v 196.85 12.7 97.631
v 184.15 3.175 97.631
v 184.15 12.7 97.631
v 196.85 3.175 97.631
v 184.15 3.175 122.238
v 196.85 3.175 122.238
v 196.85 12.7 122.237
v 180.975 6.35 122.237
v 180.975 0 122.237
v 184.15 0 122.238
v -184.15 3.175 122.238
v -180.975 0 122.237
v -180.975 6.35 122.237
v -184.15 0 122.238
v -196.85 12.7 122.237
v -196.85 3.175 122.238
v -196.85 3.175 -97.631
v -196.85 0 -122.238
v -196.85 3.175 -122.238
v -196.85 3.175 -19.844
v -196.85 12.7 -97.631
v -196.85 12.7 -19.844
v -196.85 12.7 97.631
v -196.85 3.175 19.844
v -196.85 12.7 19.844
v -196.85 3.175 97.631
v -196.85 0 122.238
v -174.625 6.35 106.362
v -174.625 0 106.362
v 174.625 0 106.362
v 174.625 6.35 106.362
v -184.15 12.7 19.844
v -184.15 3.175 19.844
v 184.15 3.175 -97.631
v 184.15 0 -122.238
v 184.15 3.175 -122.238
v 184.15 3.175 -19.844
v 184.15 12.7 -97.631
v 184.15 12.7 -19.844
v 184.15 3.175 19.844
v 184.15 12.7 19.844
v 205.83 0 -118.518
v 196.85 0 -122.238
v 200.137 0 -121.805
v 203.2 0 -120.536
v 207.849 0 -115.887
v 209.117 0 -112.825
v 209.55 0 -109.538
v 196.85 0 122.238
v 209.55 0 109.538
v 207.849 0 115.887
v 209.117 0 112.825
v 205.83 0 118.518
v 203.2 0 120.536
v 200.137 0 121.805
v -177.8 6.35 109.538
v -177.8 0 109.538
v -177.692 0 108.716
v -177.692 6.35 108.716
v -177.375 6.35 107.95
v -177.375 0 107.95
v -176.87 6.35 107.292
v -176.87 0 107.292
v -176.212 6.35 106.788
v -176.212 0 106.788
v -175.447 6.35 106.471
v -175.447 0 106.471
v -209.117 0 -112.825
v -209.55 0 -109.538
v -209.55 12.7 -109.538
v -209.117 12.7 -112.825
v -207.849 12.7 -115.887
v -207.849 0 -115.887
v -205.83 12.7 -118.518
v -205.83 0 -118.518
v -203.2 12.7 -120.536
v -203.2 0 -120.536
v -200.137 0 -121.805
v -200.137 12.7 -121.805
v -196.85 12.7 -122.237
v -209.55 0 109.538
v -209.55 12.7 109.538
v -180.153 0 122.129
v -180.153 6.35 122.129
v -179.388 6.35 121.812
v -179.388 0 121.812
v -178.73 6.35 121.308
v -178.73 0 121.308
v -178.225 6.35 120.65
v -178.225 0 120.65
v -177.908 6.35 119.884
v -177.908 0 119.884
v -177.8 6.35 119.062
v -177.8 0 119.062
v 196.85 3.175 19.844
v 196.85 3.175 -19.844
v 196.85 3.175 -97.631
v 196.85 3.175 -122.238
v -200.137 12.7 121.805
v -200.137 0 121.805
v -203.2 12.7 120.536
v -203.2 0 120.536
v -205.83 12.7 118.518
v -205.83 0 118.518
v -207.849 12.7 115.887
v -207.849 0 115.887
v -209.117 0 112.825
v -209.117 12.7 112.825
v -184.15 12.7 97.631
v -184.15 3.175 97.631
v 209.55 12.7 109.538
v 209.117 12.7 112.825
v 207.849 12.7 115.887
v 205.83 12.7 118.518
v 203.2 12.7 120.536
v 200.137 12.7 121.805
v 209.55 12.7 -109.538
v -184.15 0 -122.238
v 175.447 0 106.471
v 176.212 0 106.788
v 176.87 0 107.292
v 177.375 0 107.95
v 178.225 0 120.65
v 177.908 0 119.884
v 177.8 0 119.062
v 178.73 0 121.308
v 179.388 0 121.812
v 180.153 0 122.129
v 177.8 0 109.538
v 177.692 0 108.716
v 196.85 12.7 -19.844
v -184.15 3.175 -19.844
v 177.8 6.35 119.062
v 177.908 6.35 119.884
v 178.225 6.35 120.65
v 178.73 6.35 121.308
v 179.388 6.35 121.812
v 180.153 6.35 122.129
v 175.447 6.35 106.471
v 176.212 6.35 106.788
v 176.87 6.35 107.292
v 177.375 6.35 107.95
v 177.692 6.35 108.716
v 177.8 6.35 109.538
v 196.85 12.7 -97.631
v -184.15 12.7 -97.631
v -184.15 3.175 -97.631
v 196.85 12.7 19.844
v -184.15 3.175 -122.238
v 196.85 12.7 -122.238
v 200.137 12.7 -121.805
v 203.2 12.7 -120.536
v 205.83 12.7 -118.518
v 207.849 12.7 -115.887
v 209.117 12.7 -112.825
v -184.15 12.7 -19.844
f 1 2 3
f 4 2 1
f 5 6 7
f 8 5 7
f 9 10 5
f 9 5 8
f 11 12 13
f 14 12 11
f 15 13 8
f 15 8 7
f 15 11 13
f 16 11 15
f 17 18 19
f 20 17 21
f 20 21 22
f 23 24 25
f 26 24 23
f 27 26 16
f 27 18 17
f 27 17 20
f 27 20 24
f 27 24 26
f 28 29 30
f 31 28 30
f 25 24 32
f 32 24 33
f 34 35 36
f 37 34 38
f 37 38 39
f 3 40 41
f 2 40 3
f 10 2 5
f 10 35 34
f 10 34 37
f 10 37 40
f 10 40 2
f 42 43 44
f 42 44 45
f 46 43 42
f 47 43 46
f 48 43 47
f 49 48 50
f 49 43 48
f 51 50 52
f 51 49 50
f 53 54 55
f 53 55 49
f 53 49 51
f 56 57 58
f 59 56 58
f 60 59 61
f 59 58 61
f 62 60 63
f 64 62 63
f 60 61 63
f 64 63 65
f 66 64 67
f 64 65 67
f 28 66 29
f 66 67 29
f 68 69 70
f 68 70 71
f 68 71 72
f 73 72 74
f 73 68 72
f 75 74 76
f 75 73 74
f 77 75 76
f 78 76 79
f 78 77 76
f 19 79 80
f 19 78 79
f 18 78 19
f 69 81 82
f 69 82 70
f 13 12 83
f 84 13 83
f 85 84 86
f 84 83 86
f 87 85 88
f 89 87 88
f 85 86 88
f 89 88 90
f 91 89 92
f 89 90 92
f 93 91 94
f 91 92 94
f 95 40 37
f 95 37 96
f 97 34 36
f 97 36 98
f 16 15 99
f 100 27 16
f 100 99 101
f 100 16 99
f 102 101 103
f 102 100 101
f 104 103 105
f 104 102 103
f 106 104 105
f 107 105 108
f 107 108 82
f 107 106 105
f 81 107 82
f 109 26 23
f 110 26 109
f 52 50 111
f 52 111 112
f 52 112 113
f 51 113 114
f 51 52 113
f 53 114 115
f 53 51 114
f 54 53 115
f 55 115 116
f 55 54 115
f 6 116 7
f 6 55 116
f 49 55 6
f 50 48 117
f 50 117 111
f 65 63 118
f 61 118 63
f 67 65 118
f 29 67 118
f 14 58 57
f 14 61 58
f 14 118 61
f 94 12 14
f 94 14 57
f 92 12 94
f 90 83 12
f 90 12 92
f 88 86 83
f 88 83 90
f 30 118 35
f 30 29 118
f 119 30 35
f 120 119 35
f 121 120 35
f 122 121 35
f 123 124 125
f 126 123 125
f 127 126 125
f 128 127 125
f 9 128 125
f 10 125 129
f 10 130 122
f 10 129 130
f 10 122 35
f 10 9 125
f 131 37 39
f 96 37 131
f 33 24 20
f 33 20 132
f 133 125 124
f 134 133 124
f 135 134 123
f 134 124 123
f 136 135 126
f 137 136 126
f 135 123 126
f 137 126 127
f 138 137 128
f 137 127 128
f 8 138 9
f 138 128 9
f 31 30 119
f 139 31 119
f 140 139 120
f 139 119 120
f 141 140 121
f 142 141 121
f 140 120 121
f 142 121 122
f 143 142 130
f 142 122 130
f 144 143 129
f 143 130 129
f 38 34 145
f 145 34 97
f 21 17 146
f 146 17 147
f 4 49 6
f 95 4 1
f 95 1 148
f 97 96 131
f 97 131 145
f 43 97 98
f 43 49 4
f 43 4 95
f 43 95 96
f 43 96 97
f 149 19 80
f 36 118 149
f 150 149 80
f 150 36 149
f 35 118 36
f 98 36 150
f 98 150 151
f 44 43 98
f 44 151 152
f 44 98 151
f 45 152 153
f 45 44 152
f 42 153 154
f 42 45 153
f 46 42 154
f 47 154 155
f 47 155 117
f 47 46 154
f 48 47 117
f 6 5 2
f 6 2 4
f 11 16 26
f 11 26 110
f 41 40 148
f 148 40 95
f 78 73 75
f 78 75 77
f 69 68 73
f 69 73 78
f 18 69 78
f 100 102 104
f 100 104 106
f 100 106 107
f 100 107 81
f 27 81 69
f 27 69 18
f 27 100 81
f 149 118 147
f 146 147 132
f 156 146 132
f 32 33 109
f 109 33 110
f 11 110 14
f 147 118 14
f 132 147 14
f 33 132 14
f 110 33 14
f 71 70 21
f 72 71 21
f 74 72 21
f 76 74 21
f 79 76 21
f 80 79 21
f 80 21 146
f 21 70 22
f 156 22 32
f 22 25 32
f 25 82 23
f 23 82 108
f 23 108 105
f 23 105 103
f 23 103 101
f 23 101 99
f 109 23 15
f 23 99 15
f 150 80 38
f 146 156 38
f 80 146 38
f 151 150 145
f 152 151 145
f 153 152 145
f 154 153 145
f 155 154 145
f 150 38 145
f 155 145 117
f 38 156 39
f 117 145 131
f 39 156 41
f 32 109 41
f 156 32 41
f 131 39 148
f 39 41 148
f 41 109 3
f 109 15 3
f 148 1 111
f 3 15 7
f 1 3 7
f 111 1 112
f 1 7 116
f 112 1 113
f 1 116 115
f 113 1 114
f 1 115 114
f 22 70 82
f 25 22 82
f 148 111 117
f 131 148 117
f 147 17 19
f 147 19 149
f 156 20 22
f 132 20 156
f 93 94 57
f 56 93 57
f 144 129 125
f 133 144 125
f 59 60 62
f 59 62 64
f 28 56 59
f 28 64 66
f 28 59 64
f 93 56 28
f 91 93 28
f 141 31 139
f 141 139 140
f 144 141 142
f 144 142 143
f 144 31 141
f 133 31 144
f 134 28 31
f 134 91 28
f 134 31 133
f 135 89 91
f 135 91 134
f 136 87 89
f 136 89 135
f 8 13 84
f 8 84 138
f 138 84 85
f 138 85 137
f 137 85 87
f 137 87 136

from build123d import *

# Parameters (mm, degrees)
F0_W     = 12.7
F0_H     = 24.60625
F0_H_2   = 39.6875
F1_DEPTH = 12.7
F2_DEPTH = 3.175
F3_DEPTH = 6.35


with BuildPart() as f1:
    # F0 (on Front) → F1 (new body)
    with BuildSketch(Plane.XZ):
        with BuildLine():
            Line((-196.85, 97.63125), (-196.85, 122.2375))
            ThreePointArc((-196.85, 122.2375), (-205.830256, 118.517756), (-209.55, 109.5375))
            Line((-209.55, 109.5375), (-209.55, -109.5375))
            ThreePointArc((-209.55, -109.5375), (-205.830256, -118.517756), (-196.85, -122.2375))
            Line((-196.85, -122.2375), (-196.85, -97.63125))
            Line((-196.85, -97.63125), (-196.85, -19.84375))
            Line((-196.85, -19.84375), (-196.85, 19.84375))
            Line((-196.85, 19.84375), (-196.85, 97.63125))
        make_face()
        with Locations((-190.5, 109.934375)):
            Rectangle(F0_W, F0_H)
        with Locations((-190.5, 0)):
            Rectangle(F0_W, F0_H_2)
        with Locations((-190.5, -109.934375)):
            Rectangle(F0_W, F0_H)
        with BuildLine():
            Line((-180.975, 122.2375), (-184.15, 122.2375))
            Line((-184.15, 122.2375), (-184.15, 97.63125))
            Line((-184.15, 97.63125), (-184.15, 19.84375))
            Line((-184.15, 19.84375), (-184.15, -19.84375))
            Line((-184.15, -19.84375), (-184.15, -97.63125))
            Line((-184.15, -97.63125), (-184.15, -122.2375))
            Line((-184.15, -122.2375), (184.15, -122.2375))
            Line((184.15, -122.2375), (184.15, -97.63125))
            Line((184.15, -97.63125), (184.15, -19.84375))
            Line((184.15, -19.84375), (184.15, 19.84375))
            Line((184.15, 19.84375), (184.15, 97.63125))
            Line((184.15, 97.63125), (184.15, 122.2375))
            Line((184.15, 122.2375), (180.975, 122.2375))
            ThreePointArc((180.975, 122.2375), (178.729936, 121.307564), (177.8, 119.0625))
            Line((177.8, 119.0625), (177.8, 109.5375))
            ThreePointArc((177.8, 109.5375), (176.870064, 107.292436), (174.625, 106.3625))
            Line((174.625, 106.3625), (-174.625, 106.3625))
            ThreePointArc((-174.625, 106.3625), (-176.870064, 107.292436), (-177.8, 109.5375))
            Line((-177.8, 109.5375), (-177.8, 119.0625))
            ThreePointArc((-177.8, 119.0625), (-178.729936, 121.307564), (-180.975, 122.2375))
        make_face()
        with Locations((190.5, -109.934375)):
            Rectangle(F0_W, F0_H)
        with BuildLine():
            ThreePointArc((209.55, 109.5375), (205.830256, 118.517756), (196.85, 122.2375))
            Line((196.85, 122.2375), (196.85, 97.63125))
            Line((196.85, 97.63125), (196.85, 19.84375))
            Line((196.85, 19.84375), (196.85, -19.84375))
            Line((196.85, -19.84375), (196.85, -97.63125))
            Line((196.85, -97.63125), (196.85, -122.2375))
            ThreePointArc((196.85, -122.2375), (205.830256, -118.517756), (209.55, -109.5375))
            Line((209.55, -109.5375), (209.55, 109.5375))
        make_face()
        with Locations((190.5, 0)):
            Rectangle(F0_W, F0_H_2)
        with Locations((190.5, 109.934375)):
            Rectangle(F0_W, F0_H)
        with BuildLine():
            Line((180.975, 122.2375), (-180.975, 122.2375))
            ThreePointArc((-180.975, 122.2375), (-178.729936, 121.307564), (-177.8, 119.0625))
            Line((-177.8, 119.0625), (-177.8, 109.5375))
            ThreePointArc((-177.8, 109.5375), (-176.870064, 107.292436), (-174.625, 106.3625))
            Line((-174.625, 106.3625), (174.625, 106.3625))
            ThreePointArc((174.625, 106.3625), (176.870064, 107.292436), (177.8, 109.5375))
            Line((177.8, 109.5375), (177.8, 119.0625))
            ThreePointArc((177.8, 119.0625), (178.729936, 121.307564), (180.975, 122.2375))
        make_face()
    extrude(amount=-F1_DEPTH)

    # F0 (on Front) → F2 (cut)
    with BuildSketch(Plane.XZ):
        with Locations((-190.5, -109.934375)):
            Rectangle(F0_W, F0_H)
        with Locations((-190.5, 0)):
            Rectangle(F0_W, F0_H_2)
        with Locations((190.5, -109.934375)):
            Rectangle(F0_W, F0_H)
        with Locations((190.5, 0)):
            Rectangle(F0_W, F0_H_2)
        with Locations((190.5, 109.934375)):
            Rectangle(F0_W, F0_H)
        with Locations((-190.5, 109.934375)):
            Rectangle(F0_W, F0_H)
    extrude(amount=-F2_DEPTH, mode=Mode.SUBTRACT)

    # F0 (on Front) → F3 (cut)
    with BuildSketch(Plane.XZ):
        with BuildLine():
            Line((180.975, 122.2375), (-180.975, 122.2375))
            ThreePointArc((-180.975, 122.2375), (-178.729936, 121.307564), (-177.8, 119.0625))
            Line((-177.8, 119.0625), (-177.8, 109.5375))
            ThreePointArc((-177.8, 109.5375), (-176.870064, 107.292436), (-174.625, 106.3625))
            Line((-174.625, 106.3625), (174.625, 106.3625))
            ThreePointArc((174.625, 106.3625), (176.870064, 107.292436), (177.8, 109.5375))
            Line((177.8, 109.5375), (177.8, 119.0625))
            ThreePointArc((177.8, 119.0625), (178.729936, 121.307564), (180.975, 122.2375))
        make_face()
    extrude(amount=-F3_DEPTH, mode=Mode.SUBTRACT)


solid = f1.part
